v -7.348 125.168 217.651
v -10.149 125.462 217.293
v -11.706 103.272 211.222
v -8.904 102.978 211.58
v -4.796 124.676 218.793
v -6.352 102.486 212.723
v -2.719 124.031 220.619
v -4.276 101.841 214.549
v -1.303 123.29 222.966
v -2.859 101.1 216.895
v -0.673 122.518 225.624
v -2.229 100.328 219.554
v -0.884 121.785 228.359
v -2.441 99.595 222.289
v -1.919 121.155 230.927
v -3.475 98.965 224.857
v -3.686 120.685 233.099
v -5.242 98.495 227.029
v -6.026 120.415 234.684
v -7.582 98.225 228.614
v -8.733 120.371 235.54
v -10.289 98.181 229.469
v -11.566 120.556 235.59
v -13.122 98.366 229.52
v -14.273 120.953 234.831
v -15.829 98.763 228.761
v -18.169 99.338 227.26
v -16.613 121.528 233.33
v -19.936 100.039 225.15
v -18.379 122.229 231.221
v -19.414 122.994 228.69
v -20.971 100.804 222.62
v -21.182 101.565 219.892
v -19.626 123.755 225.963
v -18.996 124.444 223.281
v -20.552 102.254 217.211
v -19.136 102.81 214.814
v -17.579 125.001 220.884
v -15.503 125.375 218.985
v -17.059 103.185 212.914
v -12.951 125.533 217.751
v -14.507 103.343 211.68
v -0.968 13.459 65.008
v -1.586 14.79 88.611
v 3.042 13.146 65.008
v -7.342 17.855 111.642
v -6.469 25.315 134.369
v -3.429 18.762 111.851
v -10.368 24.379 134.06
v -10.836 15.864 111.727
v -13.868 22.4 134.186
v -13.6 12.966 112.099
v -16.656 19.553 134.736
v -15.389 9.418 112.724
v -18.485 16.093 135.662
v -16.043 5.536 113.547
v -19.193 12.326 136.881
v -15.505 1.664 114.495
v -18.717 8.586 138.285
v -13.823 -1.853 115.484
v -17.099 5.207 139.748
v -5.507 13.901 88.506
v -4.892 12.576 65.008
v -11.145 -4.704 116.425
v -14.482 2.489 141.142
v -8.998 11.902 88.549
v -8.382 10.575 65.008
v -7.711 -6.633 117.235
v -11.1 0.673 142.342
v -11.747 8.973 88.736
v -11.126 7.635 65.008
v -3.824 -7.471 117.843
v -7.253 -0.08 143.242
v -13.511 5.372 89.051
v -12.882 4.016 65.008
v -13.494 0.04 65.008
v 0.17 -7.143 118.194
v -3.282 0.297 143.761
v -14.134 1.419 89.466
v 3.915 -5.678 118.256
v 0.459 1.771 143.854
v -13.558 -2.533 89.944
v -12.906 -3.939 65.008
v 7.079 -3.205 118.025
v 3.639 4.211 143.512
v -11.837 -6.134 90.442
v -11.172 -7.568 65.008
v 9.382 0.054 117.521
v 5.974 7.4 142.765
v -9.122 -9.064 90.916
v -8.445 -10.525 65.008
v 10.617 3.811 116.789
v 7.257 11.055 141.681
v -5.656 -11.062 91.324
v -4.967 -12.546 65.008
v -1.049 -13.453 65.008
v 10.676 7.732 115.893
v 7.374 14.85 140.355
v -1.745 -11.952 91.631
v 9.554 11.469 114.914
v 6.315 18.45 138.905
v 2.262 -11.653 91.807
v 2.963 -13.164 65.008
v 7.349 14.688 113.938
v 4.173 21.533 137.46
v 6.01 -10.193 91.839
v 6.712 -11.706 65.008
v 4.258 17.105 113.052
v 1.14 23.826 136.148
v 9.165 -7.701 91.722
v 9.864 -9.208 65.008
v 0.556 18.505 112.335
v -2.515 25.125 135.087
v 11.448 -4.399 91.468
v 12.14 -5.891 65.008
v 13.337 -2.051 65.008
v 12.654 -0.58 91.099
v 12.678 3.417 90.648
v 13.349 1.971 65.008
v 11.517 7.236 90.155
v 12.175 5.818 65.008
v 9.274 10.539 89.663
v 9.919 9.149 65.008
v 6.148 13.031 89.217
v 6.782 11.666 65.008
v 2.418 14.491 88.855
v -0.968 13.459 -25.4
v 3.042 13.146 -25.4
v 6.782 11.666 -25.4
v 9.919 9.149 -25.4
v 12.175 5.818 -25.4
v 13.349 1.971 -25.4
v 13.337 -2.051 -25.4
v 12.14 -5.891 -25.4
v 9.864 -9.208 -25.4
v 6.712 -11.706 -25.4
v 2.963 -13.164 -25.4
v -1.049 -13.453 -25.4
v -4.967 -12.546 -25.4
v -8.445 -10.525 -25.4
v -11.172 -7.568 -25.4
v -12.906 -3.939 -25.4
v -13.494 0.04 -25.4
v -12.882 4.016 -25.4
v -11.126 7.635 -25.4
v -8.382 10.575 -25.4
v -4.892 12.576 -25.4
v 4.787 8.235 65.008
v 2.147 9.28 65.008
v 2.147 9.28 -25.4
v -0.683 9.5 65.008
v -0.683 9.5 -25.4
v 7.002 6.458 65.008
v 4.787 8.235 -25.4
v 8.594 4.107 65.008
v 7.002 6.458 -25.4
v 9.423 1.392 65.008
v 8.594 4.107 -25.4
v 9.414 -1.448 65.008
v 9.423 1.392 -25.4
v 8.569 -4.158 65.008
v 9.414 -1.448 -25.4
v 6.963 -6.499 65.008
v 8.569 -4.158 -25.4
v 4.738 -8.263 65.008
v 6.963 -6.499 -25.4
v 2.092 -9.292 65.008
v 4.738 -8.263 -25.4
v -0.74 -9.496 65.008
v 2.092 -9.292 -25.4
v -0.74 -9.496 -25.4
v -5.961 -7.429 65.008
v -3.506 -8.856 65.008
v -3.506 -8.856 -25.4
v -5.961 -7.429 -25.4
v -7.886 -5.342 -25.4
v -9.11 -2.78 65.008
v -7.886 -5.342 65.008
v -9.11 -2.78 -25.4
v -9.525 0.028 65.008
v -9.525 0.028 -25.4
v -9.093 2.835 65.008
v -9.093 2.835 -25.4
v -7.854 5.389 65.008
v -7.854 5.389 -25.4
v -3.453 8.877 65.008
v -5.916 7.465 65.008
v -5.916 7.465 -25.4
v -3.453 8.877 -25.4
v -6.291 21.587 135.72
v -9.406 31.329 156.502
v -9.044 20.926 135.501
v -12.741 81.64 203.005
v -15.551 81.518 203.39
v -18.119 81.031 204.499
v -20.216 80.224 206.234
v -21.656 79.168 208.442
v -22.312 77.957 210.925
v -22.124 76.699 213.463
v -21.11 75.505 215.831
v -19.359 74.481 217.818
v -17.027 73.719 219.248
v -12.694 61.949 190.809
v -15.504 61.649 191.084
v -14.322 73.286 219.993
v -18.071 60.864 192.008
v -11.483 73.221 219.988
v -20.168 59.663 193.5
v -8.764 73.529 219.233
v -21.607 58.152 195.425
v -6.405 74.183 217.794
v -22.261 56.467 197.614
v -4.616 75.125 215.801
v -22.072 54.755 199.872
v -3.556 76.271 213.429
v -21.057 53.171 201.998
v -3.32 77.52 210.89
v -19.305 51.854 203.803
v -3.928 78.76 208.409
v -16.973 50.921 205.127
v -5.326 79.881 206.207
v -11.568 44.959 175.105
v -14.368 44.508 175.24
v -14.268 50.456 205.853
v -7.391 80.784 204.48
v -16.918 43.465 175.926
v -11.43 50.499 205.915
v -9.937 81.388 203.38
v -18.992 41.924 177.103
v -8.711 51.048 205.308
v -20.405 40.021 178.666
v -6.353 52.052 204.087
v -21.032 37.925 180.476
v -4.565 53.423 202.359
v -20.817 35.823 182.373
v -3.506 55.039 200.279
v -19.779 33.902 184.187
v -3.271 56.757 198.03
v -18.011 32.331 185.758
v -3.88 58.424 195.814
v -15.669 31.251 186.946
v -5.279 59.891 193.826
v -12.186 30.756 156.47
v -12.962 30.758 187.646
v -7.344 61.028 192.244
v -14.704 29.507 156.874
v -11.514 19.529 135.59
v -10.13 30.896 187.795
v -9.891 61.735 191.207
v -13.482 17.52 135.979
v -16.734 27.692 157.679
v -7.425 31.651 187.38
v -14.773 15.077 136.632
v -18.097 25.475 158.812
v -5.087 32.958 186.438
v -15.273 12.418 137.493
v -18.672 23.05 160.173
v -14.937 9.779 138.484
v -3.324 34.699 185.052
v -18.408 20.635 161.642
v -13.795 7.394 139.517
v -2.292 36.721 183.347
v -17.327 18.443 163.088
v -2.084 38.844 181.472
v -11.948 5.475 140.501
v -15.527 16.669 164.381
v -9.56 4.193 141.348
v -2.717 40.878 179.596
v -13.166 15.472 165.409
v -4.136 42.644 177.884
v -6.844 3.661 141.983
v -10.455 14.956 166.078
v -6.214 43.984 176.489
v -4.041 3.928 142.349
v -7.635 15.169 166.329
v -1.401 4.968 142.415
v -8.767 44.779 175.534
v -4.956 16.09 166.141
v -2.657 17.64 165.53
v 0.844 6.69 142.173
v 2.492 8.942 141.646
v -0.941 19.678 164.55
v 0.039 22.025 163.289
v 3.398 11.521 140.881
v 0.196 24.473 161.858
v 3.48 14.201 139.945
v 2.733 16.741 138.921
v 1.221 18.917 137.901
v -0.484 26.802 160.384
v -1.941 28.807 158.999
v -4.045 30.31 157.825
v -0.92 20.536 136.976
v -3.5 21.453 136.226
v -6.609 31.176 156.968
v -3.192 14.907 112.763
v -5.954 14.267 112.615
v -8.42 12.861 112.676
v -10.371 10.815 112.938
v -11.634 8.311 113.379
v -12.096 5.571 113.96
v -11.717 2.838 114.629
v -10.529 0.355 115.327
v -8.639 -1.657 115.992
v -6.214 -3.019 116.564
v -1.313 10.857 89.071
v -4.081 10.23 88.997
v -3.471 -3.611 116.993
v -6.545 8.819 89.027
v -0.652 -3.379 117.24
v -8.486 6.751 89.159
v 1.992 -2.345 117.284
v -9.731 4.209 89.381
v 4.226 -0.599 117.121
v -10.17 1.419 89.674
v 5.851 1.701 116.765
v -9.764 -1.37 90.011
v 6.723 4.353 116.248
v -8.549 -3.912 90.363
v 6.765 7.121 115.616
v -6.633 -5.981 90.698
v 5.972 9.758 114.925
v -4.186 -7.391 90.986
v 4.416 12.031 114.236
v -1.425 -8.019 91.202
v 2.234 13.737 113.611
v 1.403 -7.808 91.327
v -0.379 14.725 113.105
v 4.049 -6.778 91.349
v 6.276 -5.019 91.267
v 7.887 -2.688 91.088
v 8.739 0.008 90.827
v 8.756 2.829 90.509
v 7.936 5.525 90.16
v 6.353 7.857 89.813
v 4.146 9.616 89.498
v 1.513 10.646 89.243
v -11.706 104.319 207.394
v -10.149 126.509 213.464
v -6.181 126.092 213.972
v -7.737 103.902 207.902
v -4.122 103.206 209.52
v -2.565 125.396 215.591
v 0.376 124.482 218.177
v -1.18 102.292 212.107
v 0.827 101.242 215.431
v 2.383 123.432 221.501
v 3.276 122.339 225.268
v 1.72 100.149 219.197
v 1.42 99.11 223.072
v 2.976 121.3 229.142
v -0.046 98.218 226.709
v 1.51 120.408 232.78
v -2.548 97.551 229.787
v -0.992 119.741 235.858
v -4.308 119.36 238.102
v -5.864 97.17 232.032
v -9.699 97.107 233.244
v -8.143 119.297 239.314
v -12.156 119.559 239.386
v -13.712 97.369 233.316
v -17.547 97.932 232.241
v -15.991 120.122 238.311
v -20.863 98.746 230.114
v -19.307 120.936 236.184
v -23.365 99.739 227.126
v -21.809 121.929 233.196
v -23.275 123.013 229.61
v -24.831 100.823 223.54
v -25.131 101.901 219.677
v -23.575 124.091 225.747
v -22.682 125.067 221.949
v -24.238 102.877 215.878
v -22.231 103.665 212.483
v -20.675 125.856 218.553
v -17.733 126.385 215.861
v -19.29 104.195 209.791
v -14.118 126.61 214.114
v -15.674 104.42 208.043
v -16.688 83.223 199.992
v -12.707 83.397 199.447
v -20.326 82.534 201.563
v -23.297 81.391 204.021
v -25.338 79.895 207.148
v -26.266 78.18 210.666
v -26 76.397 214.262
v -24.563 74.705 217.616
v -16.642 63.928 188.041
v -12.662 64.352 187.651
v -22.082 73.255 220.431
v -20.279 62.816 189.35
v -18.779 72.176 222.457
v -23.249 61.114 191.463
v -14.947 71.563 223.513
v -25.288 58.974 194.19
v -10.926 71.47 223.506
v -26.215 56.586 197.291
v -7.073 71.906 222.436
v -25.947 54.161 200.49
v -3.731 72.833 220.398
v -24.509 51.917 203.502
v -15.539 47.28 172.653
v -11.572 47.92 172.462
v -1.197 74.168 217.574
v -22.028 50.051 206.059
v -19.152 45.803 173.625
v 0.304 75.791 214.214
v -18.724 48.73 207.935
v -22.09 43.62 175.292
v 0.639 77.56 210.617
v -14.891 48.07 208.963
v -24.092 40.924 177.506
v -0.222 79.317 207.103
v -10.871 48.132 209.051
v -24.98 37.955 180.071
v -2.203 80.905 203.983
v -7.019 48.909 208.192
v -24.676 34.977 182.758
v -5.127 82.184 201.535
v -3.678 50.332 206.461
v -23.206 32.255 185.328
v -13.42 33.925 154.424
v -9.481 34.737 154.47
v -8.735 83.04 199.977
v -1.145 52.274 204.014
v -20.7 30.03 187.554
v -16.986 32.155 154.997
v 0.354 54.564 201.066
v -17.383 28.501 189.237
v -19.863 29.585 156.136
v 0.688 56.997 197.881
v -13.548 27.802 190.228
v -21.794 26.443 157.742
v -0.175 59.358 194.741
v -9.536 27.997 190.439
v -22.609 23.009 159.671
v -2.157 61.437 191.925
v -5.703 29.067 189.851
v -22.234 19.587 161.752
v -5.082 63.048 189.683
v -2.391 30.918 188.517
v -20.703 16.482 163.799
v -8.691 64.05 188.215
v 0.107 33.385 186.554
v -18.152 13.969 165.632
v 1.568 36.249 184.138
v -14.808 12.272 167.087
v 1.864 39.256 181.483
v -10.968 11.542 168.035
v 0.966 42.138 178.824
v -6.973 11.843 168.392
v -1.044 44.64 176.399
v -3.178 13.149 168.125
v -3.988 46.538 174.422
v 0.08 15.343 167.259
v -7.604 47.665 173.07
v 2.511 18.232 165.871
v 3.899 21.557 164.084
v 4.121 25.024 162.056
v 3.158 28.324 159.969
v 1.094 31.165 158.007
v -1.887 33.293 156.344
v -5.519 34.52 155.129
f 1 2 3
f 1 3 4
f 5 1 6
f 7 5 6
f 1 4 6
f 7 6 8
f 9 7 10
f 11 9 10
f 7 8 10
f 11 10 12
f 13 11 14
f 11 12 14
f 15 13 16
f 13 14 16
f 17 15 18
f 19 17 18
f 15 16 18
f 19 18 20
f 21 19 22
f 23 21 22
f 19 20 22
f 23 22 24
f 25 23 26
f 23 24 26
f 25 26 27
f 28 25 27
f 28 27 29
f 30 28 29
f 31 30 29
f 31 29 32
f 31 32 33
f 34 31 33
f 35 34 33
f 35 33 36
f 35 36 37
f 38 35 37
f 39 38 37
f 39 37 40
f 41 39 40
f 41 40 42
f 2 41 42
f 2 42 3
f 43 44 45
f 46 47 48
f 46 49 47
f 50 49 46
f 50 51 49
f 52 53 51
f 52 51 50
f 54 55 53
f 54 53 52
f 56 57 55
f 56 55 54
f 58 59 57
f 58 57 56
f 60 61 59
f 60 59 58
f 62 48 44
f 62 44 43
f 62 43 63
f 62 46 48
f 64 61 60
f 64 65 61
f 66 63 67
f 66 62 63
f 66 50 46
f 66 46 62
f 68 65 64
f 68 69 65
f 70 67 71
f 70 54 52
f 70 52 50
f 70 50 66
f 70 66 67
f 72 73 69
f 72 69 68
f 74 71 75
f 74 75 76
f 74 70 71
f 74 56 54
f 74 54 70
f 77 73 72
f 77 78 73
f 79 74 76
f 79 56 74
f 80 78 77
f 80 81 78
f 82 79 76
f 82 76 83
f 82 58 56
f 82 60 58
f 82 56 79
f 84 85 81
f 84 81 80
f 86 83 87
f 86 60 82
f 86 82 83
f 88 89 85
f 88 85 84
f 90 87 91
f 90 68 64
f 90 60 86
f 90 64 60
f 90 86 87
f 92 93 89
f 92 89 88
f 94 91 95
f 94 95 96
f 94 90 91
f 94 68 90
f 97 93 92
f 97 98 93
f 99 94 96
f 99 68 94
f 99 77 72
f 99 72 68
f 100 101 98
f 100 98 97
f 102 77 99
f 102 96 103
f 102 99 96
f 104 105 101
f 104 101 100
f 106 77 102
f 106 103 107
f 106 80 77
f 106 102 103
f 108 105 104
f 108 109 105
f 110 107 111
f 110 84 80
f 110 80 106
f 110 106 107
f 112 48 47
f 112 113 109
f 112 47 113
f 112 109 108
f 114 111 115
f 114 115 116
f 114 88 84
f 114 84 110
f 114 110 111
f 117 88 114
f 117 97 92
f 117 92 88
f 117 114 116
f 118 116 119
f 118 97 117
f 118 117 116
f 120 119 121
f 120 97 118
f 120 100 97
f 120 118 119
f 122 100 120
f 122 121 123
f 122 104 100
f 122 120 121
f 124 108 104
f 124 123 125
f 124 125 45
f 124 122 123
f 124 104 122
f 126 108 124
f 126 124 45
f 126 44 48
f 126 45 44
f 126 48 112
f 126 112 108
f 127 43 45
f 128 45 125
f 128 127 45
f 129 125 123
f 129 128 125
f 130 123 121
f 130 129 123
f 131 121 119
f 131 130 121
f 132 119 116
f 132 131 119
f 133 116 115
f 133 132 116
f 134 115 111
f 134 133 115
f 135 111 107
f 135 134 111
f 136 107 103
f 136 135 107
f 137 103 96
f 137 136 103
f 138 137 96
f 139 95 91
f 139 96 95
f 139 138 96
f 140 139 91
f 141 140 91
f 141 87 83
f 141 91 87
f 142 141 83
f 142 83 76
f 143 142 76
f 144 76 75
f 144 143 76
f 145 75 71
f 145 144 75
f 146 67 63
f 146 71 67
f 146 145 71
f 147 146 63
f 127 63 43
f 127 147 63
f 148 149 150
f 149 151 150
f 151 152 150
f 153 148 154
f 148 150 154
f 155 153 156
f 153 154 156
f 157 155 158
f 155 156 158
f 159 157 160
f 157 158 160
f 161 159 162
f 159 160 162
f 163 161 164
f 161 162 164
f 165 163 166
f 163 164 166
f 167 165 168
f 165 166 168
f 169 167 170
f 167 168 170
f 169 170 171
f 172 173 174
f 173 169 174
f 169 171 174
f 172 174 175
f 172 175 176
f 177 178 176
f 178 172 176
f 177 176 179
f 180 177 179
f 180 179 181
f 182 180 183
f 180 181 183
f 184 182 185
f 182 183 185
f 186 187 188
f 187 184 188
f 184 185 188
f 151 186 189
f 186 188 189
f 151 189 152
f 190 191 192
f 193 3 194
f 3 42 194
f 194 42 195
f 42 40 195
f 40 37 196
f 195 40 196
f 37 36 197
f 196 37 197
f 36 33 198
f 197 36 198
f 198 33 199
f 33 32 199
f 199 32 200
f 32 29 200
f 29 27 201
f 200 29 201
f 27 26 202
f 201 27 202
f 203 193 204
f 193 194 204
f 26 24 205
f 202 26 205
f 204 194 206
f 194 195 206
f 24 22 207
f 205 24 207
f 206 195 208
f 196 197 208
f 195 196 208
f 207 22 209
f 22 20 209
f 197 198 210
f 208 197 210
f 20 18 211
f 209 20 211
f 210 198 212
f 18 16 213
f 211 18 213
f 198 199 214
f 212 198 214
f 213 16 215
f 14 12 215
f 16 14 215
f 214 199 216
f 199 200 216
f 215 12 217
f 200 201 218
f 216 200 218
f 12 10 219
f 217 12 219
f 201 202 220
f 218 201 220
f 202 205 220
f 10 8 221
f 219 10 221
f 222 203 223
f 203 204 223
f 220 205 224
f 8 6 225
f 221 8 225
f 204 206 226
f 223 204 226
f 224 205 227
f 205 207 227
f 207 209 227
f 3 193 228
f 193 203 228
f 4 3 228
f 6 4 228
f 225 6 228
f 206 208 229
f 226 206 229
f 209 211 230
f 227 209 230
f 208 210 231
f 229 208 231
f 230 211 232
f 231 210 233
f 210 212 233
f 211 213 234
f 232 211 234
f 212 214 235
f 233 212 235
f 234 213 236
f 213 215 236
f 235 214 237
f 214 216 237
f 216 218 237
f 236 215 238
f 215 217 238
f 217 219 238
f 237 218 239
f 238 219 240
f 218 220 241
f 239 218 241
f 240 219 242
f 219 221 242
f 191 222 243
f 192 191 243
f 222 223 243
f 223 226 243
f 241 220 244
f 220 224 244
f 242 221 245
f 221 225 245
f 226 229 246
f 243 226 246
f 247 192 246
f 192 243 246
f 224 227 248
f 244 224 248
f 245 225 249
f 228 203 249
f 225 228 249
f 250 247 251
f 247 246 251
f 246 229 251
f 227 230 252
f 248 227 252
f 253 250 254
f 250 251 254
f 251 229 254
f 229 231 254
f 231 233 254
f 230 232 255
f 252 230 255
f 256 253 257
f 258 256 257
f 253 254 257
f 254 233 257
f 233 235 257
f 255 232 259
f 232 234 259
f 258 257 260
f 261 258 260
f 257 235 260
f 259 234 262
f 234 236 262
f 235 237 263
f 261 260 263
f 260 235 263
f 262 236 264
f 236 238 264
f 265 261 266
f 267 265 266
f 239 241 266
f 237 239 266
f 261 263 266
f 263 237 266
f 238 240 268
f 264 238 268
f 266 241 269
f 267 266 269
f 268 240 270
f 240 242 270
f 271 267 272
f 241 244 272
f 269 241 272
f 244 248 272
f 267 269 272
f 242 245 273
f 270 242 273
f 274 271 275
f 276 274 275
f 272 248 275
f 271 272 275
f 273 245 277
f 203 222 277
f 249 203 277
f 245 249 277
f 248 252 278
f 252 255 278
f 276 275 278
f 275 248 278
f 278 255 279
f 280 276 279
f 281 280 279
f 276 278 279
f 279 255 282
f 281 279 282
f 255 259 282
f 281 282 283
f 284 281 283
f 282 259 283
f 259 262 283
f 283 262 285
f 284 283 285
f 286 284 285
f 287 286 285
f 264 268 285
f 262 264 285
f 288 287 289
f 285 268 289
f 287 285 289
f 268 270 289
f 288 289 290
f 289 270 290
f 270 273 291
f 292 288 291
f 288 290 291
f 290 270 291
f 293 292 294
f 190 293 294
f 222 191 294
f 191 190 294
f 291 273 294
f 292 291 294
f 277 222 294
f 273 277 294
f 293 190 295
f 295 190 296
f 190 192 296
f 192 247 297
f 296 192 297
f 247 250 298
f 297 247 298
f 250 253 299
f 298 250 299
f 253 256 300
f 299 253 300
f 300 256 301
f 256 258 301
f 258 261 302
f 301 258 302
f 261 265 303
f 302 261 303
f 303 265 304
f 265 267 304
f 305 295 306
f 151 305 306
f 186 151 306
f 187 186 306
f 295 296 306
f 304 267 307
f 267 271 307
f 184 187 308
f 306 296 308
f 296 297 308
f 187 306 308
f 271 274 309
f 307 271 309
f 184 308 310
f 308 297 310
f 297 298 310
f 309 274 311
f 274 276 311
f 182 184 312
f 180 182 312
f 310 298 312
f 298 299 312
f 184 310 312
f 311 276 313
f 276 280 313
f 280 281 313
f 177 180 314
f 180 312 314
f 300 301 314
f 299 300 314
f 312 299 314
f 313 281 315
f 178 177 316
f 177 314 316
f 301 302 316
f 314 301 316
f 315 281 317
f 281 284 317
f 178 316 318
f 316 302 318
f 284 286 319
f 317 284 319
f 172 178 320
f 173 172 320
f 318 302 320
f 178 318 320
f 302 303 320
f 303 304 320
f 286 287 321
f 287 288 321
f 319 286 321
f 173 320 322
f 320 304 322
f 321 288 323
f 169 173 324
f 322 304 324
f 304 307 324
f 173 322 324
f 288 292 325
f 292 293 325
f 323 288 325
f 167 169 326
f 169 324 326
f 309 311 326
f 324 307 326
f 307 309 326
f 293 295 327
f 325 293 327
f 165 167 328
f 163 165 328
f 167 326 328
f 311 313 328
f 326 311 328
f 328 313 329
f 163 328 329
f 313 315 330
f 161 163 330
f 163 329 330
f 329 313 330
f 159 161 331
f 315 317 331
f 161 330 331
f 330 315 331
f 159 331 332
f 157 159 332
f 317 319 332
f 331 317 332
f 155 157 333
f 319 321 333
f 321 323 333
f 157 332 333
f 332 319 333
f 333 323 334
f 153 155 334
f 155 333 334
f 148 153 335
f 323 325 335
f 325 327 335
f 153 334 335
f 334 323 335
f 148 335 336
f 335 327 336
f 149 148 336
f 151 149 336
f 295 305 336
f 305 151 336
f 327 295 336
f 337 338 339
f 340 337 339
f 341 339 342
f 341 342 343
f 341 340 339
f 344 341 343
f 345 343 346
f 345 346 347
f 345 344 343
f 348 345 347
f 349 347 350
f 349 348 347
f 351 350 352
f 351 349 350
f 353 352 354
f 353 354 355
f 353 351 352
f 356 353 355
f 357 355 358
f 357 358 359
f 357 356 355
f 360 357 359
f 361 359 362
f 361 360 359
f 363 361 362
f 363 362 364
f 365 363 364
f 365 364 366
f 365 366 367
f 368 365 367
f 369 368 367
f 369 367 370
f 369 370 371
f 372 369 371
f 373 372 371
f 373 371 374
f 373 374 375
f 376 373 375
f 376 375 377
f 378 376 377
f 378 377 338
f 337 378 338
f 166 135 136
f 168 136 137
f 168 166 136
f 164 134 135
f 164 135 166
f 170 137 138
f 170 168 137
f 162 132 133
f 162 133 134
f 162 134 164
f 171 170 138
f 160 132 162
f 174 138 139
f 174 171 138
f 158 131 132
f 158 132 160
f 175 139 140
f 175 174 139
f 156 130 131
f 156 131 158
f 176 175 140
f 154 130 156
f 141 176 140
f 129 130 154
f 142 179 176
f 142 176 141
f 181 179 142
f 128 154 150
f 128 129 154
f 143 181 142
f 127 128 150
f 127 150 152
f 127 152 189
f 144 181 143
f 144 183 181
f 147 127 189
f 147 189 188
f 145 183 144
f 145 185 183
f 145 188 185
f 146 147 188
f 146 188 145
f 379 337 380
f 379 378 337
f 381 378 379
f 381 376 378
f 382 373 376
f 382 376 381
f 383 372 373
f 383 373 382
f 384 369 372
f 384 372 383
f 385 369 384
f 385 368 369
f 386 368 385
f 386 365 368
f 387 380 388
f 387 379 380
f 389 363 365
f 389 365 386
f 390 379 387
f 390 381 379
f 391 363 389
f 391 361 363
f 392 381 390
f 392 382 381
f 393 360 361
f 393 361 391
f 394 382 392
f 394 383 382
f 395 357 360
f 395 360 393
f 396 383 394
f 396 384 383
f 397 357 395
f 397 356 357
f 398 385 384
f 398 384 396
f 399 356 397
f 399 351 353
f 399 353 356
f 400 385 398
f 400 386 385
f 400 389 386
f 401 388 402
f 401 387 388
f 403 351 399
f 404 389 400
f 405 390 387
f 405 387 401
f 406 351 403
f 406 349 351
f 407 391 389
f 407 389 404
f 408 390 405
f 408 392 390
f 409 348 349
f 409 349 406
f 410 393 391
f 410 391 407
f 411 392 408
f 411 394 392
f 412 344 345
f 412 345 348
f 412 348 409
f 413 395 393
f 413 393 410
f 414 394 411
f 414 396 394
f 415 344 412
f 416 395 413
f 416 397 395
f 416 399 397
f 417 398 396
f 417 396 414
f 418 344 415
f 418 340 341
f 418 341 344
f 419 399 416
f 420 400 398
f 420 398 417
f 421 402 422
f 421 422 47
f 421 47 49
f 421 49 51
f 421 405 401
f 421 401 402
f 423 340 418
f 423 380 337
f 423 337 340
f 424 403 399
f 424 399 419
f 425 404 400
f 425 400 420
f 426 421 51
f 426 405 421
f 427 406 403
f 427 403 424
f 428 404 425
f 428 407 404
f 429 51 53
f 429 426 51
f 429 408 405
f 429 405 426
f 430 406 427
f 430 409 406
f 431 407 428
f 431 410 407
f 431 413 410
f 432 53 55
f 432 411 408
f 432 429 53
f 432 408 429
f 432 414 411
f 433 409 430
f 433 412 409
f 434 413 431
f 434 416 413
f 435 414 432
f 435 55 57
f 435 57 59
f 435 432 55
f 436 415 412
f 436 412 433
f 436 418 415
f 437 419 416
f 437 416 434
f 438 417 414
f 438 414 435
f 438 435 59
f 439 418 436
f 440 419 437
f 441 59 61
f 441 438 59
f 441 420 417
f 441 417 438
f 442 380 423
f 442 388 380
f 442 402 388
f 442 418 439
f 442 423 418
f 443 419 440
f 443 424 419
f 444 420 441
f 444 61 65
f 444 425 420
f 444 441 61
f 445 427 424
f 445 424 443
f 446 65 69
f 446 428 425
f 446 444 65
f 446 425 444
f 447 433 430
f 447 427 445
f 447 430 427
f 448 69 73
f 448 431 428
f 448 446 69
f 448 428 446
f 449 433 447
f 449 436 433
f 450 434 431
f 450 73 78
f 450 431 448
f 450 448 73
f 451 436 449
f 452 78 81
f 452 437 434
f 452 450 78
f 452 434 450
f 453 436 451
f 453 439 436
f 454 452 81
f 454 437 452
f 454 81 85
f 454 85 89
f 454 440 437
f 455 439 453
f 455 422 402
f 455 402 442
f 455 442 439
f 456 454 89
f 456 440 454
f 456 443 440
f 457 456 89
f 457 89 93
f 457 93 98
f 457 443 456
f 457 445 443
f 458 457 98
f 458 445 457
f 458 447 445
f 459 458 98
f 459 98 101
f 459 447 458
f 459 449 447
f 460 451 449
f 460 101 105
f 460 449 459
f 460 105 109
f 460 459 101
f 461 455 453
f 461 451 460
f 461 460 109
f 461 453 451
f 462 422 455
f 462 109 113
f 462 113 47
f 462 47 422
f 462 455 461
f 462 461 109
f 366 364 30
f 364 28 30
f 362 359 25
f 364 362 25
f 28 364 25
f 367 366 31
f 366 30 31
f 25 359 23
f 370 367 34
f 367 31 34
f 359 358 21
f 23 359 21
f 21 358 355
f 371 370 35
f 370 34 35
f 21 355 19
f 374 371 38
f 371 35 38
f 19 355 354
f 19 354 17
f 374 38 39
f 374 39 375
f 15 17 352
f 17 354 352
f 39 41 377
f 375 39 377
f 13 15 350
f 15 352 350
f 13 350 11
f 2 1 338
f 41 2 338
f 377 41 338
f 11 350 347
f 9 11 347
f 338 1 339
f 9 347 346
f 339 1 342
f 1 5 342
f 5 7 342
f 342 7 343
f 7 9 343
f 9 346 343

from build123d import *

# Parameters (mm, degrees)
SWEEP1_PROFILE_R     = 13.49375
CUT_SWEEP1_PROFILE_R = 9.525


with BuildPart() as part:
    # Sweep1: sweep along a curve in space
    with BuildLine() as sweep1_path:
        Line((0, 0, 0), (0, 0, -25.4))
        Line((0, 0, 0), (0, 0, 65.008326235))
        ThreePointArc((-5.864570369, 12.64082052, 138.960948382), (-1.478930869, 3.187769693, 102.635357248), (0, 0, 65.008326235))
        ThreePointArc((-11.705580718, 100.75868887, 220.409758136), (-12.308159492, 46.60541038, 190.353572184), (-5.864570369, 12.64082052, 138.960948382))
        Line((-10.149398836, 122.948822825, 226.479981937), (-11.705580718, 100.75868887, 220.409758136))
    # Sweep1 profile (on start of the path) → Sweep1 (sweep)
    with BuildSketch(Plane(origin=(-10.149398836, 122.948822825, 226.479981937), x_dir=(0, 0.26386051670744176, -0.9645608470816561), z_dir=(-0.06748988993383706, -0.9623616079186076, -0.2632589036690513))):
        Circle(SWEEP1_PROFILE_R)
    sweep(path=sweep1_path.line)

    # Cut-Sweep1: sweep along a curve in space
    with BuildLine() as cut_sweep1_path:
        Line((0, 0, 0), (0, 0, -25.4))
        Line((0, 0, 0), (0, 0, 65.008326235))
        ThreePointArc((-5.864570369, 12.64082052, 138.960948382), (-1.478930869, 3.187769693, 102.635357248), (0, 0, 65.008326235))
        ThreePointArc((-11.705580718, 100.75868887, 220.409758136), (-12.308159492, 46.60541038, 190.353572184), (-5.864570369, 12.64082052, 138.960948382))
        Line((-10.149398836, 122.948822825, 226.479981937), (-11.705580718, 100.75868887, 220.409758136))
    # Cut-Sweep1 profile (on start of the path) → Cut-Sweep1 (sweep, cut)
    with BuildSketch(Plane(origin=(-10.149398836, 122.948822825, 226.479981937), x_dir=(0, 0.26386051670744176, -0.9645608470816561), z_dir=(-0.06748988993383706, -0.9623616079186076, -0.2632589036690513))):
        Circle(CUT_SWEEP1_PROFILE_R)
    sweep(path=cut_sweep1_path.line, mode=Mode.SUBTRACT)


solid = part.part
